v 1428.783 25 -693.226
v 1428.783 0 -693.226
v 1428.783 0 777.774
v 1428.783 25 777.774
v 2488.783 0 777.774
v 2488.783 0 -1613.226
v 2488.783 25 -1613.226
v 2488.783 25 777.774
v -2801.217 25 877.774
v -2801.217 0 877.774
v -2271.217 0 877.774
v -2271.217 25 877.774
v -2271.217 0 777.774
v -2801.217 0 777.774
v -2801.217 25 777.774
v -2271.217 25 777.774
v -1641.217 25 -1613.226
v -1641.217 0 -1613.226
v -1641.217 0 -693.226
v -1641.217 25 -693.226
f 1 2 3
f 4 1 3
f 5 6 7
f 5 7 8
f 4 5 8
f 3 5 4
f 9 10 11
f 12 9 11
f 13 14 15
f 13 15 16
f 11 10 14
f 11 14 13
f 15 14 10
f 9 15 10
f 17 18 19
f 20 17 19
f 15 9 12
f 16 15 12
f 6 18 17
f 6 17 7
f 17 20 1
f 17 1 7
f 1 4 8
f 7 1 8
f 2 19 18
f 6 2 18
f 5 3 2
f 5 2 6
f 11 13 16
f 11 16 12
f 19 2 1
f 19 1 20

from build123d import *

# Parameters (mm, degrees)
F0_W     = 530
F0_H     = 100
F1_DEPTH = 25
F0_W_2   = 3070
F0_H_2   = 920
F0_W_3   = 543.6974744081
F0_W_4   = 516.3025255919
F0_H_3   = 1471


with BuildPart() as f1:
    # F0 (on Front) → F1 (new body)
    with BuildSketch(Plane.XZ):
        with Locations((-2536.2168025541, 827.7740448676)):
            Rectangle(F0_W, F0_H)
    extrude(amount=-F1_DEPTH)


with BuildPart() as f1b:
    # F0 (on Front) → F1, piece 2 (new body)
    with BuildSketch(Plane.XZ):
        with Locations((-106.2168025541, -1153.2259551324)):
            Rectangle(F0_W_2, F0_H_2)
        with Locations((1700.63193465, -1153.2259551324)):
            Rectangle(F0_W_3, F0_H_2)
        with Locations((2230.63193465, -1153.2259551324)):
            Rectangle(F0_W_4, F0_H_2)
        with Locations((1700.63193465, 42.2740448676)):
            Rectangle(F0_W_3, F0_H_3)
        with Locations((2230.63193465, 42.2740448676)):
            Rectangle(F0_W_4, F0_H_3)
    extrude(amount=-F1_DEPTH)


solid = Compound([f1.part, f1b.part])
